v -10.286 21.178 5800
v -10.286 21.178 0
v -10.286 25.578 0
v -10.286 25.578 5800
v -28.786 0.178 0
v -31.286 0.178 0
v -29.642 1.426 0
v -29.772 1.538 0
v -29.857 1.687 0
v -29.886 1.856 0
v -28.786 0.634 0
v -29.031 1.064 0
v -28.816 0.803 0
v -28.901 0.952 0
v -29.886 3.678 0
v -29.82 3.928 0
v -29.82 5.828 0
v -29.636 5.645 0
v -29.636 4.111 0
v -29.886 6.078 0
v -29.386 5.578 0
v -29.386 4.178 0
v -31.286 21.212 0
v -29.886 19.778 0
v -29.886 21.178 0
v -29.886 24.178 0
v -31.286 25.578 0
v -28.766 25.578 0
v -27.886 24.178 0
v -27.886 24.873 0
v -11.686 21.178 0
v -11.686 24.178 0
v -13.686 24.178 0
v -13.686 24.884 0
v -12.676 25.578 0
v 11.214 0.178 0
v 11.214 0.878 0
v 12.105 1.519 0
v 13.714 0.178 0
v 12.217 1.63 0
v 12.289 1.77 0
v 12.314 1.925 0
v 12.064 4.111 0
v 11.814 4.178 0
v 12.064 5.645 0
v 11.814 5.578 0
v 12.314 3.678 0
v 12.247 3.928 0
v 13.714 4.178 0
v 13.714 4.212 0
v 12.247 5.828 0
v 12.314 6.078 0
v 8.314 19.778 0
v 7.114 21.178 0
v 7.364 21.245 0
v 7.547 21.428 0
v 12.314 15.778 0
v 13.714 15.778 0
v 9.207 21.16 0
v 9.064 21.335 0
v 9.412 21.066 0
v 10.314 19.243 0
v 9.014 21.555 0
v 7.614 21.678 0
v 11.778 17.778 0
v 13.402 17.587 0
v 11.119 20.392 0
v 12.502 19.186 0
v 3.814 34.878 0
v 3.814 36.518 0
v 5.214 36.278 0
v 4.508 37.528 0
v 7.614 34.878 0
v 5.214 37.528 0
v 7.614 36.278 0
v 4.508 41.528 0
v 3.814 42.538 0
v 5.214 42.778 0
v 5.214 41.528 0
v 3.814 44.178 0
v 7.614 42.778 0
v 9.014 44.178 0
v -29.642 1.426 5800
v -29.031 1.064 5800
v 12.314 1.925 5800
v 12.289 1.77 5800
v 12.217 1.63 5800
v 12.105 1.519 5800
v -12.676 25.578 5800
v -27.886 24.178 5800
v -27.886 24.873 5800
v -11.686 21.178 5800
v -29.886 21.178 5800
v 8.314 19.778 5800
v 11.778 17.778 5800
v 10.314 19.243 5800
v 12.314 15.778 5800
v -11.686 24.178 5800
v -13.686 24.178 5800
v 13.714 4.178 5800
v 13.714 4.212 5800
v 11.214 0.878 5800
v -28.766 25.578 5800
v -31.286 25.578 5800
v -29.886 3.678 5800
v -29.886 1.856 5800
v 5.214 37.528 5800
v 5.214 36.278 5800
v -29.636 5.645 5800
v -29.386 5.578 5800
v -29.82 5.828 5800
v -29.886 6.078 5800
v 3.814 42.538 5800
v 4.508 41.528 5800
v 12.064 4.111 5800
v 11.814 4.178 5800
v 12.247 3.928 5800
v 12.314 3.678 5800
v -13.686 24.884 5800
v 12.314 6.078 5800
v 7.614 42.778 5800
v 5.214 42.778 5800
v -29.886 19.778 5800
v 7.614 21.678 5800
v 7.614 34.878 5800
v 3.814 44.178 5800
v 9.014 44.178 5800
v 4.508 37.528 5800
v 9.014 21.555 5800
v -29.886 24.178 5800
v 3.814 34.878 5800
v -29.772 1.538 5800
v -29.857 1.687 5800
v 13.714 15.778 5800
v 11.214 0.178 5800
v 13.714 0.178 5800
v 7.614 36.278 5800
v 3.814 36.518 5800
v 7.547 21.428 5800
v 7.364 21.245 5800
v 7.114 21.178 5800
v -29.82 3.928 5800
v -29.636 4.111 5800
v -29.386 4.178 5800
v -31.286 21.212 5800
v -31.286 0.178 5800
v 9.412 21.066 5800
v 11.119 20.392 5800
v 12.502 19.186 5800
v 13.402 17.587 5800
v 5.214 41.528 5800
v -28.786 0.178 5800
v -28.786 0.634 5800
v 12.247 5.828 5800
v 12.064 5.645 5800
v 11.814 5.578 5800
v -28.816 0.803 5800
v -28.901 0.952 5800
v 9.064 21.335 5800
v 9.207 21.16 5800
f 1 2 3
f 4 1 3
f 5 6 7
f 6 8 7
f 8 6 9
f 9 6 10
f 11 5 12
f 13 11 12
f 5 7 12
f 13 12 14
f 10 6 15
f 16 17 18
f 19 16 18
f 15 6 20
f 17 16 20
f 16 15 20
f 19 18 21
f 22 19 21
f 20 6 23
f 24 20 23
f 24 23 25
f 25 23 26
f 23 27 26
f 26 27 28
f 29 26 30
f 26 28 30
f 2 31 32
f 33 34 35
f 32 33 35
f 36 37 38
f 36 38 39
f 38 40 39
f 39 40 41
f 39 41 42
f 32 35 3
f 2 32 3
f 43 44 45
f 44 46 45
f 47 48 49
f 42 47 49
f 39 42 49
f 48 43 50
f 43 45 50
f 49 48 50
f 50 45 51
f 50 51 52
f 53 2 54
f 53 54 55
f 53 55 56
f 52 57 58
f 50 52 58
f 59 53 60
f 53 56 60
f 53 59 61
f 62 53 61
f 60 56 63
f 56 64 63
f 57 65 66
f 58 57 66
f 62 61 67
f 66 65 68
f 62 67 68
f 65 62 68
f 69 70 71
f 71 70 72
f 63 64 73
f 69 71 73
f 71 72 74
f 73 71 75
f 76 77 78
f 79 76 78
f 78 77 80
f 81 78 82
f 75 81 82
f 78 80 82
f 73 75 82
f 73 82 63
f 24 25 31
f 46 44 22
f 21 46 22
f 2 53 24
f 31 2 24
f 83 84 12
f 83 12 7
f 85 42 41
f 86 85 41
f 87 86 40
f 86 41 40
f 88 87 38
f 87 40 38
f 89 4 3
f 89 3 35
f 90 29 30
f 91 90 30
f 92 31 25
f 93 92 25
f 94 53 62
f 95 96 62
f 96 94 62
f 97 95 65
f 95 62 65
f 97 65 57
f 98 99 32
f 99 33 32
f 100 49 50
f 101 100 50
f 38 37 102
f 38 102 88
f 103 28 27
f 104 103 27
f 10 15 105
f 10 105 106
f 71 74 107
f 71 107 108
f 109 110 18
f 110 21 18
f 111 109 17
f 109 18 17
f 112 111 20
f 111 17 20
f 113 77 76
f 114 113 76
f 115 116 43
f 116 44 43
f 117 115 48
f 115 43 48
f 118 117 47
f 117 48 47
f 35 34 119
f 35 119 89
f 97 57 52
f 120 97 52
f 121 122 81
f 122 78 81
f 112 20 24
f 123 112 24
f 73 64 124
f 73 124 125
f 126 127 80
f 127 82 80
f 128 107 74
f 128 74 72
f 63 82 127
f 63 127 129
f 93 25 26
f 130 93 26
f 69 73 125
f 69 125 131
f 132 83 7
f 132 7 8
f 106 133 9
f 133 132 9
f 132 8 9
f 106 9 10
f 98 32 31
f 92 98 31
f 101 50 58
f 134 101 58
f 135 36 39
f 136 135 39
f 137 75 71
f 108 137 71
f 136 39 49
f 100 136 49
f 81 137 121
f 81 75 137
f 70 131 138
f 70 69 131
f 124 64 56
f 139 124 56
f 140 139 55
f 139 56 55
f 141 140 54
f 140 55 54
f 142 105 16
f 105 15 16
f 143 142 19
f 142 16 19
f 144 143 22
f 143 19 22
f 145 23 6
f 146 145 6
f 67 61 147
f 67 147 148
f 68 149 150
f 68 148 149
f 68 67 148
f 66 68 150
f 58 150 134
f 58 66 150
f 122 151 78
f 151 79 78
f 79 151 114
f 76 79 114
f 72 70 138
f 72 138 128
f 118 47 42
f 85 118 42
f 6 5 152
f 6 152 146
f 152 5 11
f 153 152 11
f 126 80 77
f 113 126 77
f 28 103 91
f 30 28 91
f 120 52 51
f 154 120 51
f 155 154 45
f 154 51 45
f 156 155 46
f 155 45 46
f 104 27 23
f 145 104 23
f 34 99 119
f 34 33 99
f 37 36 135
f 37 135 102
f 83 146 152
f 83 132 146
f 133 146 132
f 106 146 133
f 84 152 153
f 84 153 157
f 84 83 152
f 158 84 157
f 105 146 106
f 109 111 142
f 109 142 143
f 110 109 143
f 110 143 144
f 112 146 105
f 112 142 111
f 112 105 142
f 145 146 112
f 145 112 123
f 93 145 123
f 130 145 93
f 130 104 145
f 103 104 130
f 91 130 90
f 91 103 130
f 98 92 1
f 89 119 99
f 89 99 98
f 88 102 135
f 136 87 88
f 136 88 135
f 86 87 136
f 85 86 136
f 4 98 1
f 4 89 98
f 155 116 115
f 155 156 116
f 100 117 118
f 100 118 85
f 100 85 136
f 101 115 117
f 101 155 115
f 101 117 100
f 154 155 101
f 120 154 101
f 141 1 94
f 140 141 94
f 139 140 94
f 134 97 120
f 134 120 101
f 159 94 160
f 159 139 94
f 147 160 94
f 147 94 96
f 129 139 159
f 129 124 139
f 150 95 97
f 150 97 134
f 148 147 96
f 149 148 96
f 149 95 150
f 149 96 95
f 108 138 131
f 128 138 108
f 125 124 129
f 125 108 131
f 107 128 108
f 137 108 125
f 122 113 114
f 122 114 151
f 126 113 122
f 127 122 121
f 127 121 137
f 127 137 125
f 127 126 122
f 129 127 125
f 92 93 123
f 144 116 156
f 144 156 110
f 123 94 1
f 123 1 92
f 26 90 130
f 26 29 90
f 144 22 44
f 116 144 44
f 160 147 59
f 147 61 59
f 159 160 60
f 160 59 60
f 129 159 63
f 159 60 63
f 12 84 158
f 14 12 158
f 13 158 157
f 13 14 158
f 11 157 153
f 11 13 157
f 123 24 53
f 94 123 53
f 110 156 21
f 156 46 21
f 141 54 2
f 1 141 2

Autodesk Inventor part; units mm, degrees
ref_plane "YZ Plane" through (0, 0, 0) normal (1, 0, 0) x (0, 1, 0)
ref_plane "Plano inicial" through (0, 0, 0) normal (0, 0, 1) x (1, 0, 0)
ref_plane "Plano final" through (0, 0, 5800) normal (0, 0, 1) x (1, 0, 0)
sketch "Boceto1" plane through (0, 0, 0) normal (0, 0, 1) x (1, 0, 0)
  line L0 (-31.2865, 21.2119) -> (-31.2865, 0.1784)
  line L1 (-29.3865, 4.1784) -> (11.8135, 4.1784)
  line L2 (13.7135, 0.1784) -> (13.7135, 15.7784)
  line L3 (9.0135, 44.1784) -> (9.0135, 21.5551)
  line L4 (9.0135, 44.1784) -> (3.8135, 44.1784)
  line L5 (5.2135, 42.7784) -> (7.6135, 42.7784)
  line L6 (7.6135, 36.2784) -> (5.2135, 36.2784)
  line L7 (-29.8865, 19.7784) -> (8.3135, 19.7784)
  line L8 (12.3135, 15.7784) -> (12.3135, 6.0784)
  line L9 (11.8135, 5.5784) -> (-29.3865, 5.5784)
  line L10 (-29.8865, 6.0784) -> (-29.8865, 19.7784)
  arc A0 (13.7135, 15.7784) -> (9.4118, 21.0655) centre (8.3135, 15.7784) ccw
  arc A1 (12.3135, 15.7784) -> (8.3135, 19.7784) centre (8.3135, 15.7784) ccw
  line L11 (12.3135, 3.6784) -> (12.3135, 1.9253)
  line L12 (11.2135, 0.1784) -> (13.7135, 0.1784)
  line L13 (7.6135, 21.6784) -> (7.6135, 34.8784)
  line L14 (7.6135, 36.2784) -> (7.6135, 42.7784)
  line L15 (-29.8865, 3.6784) -> (-29.8865, 1.8562)
  line L16 (-28.7865, 0.1784) -> (-31.2865, 0.1784)
  line L17 (-28.7865, 0.1784) -> (-28.7865, 0.6338)
  line L18 (11.2135, 0.1784) -> (11.2135, 0.8784)
  line L19 (-29.8865, 21.1784) -> (-29.8865, 24.1784)
  line L20 (-28.7665, 25.5784) -> (-31.2865, 25.5784)
  line L21 (-31.2865, 25.5784) -> (-31.2865, 21.2119)
  line L22 (-10.2865, 21.1784) -> (-10.2865, 25.5784)
  line L23 (-10.2865, 25.5784) -> (-12.6765, 25.5784)
  line L24 (-11.6865, 24.1784) -> (-11.6865, 21.1784)
  line L25 (7.1135, 21.1784) -> (-10.2865, 21.1784)
  line L26 (-11.6865, 21.1784) -> (-29.8865, 21.1784)
  line L27 (-27.8865, 24.1784) -> (-29.8865, 24.1784)
  line L28 (-13.6865, 24.1784) -> (-11.6865, 24.1784)
  line L29 (-29.0312, 1.0637) -> (-29.6418, 1.4262)
  line L30 (11.2135, 0.8784) -> (12.1053, 1.5192)
  line L31 (-27.8865, 24.1784) -> (-27.8865, 24.8734)
  line L32 (-13.6865, 24.1784) -> (-13.6865, 24.8843)
  line L33 (-28.7665, 25.5784) -> (-27.8865, 24.8734)
  line L34 (-13.6865, 24.8843) -> (-12.6765, 25.5784)
  line L35 (7.6135, 34.8784) -> (3.8135, 34.8784)
  line L36 (5.2135, 37.5284) -> (5.2135, 36.2784)
  line L37 (5.2135, 41.5284) -> (5.2135, 42.7784)
  line L38 (5.2135, 37.5284) -> (4.5077, 37.5284)
  line L39 (5.2135, 41.5284) -> (4.5077, 41.5284)
  line L40 (3.8135, 44.1784) -> (3.8135, 42.5384)
  line L41 (3.8135, 42.5384) -> (4.5077, 41.5284)
  line L42 (3.8135, 34.8784) -> (3.8135, 36.5184)
  line L43 (3.8135, 36.5184) -> (4.5077, 37.5284)
  arc A2 (7.1135, 21.1784) -> (7.6135, 21.6784) centre (7.1135, 21.6784) ccw
  arc A3 (9.0135, 21.5551) -> (9.4118, 21.0655) centre (9.5135, 21.5551) ccw
  arc A4 (11.8135, 5.5784) -> (12.3135, 6.0784) centre (11.8135, 6.0784) ccw
  arc A5 (12.3135, 3.6784) -> (11.8135, 4.1784) centre (11.8135, 3.6784) ccw
  arc A6 (12.1053, 1.5192) -> (12.3135, 1.9253) centre (11.8135, 1.9253) ccw
  arc A7 (-29.8865, 6.0784) -> (-29.3865, 5.5784) centre (-29.3865, 6.0784) ccw
  arc A8 (-29.3865, 4.1784) -> (-29.8865, 3.6784) centre (-29.3865, 3.6784) ccw
  arc A9 (-29.8865, 1.8562) -> (-29.6418, 1.4262) centre (-29.3865, 1.8562) ccw
  line L44 (13.7135, 4.1784) -> (13.7135, 4.2119)
  arc A10 (-28.7865, 0.6338) -> (-29.0312, 1.0637) centre (-29.2865, 0.6338) ccw
  point P0 (0, 0)
  point P1 (5.2135, 42.1534)
  point P2 (-28.7865, 4.1784)
  point P3 (7.6135, 39.5284)
  point P4 (-28.7865, 0.9184)
  dimension "d16" = 5.4
  dimension "d17" = 4
  dimension "d32" = 1.4
  dimension "d35" = 1.4
  dimension "d37" = 3
  dimension "d38" = 25.4
  dimension "d44" = 18.2
  dimension "d50" = 0.7
  dimension "d53" = 40.3
  dimension "d54" = 37.5
  dimension "d55" = 1.4
  dimension "d57" = 17
  dimension "d62" = 30.7
  dimension "d63" = 35.7
  dimension "d64" = 4.4
  dimension "d66" = 3
  dimension "d69" = 4.4
  dimension "d71" = 3.4
  dimension "d72" = 3.4
  dimension "d73" = 0.88
  dimension "d74" = 1.01
  dimension "d75" = 34.5
  dimension "d76" = 38.7
  dimension "d77" = 0.695
  dimension "d78" = 0.7058
  dimension "d81" = 23
  dimension "d82" = 44
  dimension "d84" = 6.5
  dimension "d85" = 2.4
  dimension "d86" = 2.4
  dimension "d87" = 9.3
  dimension "d88" = 1.4
  dimension "d99" = 1.4
  dimension "d100" = 1.4
  dimension "d102" = 1.4
  dimension "d140" = 111
  dimension "d141" = 4
  dimension "d142" = 6.02
  dimension "d143" = 0.7058
  dimension "d144" = 0.7058
  dimension "d199" = 1.4
  dimension "d201" = 14.2
  dimension "d202" = 0.5
  dimension "d203" = 3.01
  dimension "d204" = 2
  dimension "d205" = 2.5
  dimension "d206" = 4.7
  dimension "d207" = 6.1
  dimension "d208" = 42.5
  dimension "d210" = 5.4
  dimension "d211" = 4
  dimension "d213" = 13.7135
  dimension "d216" = 4.0335
  dimension "d218" = 0.74
  dimension "d219" = 0.5
  dimension "d220" = 45
  dimension "d221" = 5.2
  dimension "d222" = 1.4
  dimension "d223" = 14.2
  dimension "d225" = 2
extrude "Cuerpo" add sketch "Boceto1" along normal up to surface (5800 mm away) from surface at 0
sketch "Boceto2" plane through (0, 0, 0) normal (0, 0, 1) x (1, 0, 0)
  line L0 (0, 0) -> (10, 0)
ref_plane "Plano de trabajo3" through (0, 0, 0) normal (0, -1, 0) x (1, 0, 0)
sketch "Boceto3" plane through (0, 0, 0) normal (0, -1, 0) x (1, 0, 0)
  line L0 (-40.2865, 0) -> (22.7135, 0)
  line L1 (-40.2865, 5800) -> (22.7135, 5800)
  dimension "d231" = 5800
equation "\"G_OFFSET_START\" = 0"
equation "\"G_OFFSET_END\" = 0"
equation "\"G_L\" = 5800"
properties part number "SP40-01 MARCO BATIENTE - PAÑO" material "Aluminio"
